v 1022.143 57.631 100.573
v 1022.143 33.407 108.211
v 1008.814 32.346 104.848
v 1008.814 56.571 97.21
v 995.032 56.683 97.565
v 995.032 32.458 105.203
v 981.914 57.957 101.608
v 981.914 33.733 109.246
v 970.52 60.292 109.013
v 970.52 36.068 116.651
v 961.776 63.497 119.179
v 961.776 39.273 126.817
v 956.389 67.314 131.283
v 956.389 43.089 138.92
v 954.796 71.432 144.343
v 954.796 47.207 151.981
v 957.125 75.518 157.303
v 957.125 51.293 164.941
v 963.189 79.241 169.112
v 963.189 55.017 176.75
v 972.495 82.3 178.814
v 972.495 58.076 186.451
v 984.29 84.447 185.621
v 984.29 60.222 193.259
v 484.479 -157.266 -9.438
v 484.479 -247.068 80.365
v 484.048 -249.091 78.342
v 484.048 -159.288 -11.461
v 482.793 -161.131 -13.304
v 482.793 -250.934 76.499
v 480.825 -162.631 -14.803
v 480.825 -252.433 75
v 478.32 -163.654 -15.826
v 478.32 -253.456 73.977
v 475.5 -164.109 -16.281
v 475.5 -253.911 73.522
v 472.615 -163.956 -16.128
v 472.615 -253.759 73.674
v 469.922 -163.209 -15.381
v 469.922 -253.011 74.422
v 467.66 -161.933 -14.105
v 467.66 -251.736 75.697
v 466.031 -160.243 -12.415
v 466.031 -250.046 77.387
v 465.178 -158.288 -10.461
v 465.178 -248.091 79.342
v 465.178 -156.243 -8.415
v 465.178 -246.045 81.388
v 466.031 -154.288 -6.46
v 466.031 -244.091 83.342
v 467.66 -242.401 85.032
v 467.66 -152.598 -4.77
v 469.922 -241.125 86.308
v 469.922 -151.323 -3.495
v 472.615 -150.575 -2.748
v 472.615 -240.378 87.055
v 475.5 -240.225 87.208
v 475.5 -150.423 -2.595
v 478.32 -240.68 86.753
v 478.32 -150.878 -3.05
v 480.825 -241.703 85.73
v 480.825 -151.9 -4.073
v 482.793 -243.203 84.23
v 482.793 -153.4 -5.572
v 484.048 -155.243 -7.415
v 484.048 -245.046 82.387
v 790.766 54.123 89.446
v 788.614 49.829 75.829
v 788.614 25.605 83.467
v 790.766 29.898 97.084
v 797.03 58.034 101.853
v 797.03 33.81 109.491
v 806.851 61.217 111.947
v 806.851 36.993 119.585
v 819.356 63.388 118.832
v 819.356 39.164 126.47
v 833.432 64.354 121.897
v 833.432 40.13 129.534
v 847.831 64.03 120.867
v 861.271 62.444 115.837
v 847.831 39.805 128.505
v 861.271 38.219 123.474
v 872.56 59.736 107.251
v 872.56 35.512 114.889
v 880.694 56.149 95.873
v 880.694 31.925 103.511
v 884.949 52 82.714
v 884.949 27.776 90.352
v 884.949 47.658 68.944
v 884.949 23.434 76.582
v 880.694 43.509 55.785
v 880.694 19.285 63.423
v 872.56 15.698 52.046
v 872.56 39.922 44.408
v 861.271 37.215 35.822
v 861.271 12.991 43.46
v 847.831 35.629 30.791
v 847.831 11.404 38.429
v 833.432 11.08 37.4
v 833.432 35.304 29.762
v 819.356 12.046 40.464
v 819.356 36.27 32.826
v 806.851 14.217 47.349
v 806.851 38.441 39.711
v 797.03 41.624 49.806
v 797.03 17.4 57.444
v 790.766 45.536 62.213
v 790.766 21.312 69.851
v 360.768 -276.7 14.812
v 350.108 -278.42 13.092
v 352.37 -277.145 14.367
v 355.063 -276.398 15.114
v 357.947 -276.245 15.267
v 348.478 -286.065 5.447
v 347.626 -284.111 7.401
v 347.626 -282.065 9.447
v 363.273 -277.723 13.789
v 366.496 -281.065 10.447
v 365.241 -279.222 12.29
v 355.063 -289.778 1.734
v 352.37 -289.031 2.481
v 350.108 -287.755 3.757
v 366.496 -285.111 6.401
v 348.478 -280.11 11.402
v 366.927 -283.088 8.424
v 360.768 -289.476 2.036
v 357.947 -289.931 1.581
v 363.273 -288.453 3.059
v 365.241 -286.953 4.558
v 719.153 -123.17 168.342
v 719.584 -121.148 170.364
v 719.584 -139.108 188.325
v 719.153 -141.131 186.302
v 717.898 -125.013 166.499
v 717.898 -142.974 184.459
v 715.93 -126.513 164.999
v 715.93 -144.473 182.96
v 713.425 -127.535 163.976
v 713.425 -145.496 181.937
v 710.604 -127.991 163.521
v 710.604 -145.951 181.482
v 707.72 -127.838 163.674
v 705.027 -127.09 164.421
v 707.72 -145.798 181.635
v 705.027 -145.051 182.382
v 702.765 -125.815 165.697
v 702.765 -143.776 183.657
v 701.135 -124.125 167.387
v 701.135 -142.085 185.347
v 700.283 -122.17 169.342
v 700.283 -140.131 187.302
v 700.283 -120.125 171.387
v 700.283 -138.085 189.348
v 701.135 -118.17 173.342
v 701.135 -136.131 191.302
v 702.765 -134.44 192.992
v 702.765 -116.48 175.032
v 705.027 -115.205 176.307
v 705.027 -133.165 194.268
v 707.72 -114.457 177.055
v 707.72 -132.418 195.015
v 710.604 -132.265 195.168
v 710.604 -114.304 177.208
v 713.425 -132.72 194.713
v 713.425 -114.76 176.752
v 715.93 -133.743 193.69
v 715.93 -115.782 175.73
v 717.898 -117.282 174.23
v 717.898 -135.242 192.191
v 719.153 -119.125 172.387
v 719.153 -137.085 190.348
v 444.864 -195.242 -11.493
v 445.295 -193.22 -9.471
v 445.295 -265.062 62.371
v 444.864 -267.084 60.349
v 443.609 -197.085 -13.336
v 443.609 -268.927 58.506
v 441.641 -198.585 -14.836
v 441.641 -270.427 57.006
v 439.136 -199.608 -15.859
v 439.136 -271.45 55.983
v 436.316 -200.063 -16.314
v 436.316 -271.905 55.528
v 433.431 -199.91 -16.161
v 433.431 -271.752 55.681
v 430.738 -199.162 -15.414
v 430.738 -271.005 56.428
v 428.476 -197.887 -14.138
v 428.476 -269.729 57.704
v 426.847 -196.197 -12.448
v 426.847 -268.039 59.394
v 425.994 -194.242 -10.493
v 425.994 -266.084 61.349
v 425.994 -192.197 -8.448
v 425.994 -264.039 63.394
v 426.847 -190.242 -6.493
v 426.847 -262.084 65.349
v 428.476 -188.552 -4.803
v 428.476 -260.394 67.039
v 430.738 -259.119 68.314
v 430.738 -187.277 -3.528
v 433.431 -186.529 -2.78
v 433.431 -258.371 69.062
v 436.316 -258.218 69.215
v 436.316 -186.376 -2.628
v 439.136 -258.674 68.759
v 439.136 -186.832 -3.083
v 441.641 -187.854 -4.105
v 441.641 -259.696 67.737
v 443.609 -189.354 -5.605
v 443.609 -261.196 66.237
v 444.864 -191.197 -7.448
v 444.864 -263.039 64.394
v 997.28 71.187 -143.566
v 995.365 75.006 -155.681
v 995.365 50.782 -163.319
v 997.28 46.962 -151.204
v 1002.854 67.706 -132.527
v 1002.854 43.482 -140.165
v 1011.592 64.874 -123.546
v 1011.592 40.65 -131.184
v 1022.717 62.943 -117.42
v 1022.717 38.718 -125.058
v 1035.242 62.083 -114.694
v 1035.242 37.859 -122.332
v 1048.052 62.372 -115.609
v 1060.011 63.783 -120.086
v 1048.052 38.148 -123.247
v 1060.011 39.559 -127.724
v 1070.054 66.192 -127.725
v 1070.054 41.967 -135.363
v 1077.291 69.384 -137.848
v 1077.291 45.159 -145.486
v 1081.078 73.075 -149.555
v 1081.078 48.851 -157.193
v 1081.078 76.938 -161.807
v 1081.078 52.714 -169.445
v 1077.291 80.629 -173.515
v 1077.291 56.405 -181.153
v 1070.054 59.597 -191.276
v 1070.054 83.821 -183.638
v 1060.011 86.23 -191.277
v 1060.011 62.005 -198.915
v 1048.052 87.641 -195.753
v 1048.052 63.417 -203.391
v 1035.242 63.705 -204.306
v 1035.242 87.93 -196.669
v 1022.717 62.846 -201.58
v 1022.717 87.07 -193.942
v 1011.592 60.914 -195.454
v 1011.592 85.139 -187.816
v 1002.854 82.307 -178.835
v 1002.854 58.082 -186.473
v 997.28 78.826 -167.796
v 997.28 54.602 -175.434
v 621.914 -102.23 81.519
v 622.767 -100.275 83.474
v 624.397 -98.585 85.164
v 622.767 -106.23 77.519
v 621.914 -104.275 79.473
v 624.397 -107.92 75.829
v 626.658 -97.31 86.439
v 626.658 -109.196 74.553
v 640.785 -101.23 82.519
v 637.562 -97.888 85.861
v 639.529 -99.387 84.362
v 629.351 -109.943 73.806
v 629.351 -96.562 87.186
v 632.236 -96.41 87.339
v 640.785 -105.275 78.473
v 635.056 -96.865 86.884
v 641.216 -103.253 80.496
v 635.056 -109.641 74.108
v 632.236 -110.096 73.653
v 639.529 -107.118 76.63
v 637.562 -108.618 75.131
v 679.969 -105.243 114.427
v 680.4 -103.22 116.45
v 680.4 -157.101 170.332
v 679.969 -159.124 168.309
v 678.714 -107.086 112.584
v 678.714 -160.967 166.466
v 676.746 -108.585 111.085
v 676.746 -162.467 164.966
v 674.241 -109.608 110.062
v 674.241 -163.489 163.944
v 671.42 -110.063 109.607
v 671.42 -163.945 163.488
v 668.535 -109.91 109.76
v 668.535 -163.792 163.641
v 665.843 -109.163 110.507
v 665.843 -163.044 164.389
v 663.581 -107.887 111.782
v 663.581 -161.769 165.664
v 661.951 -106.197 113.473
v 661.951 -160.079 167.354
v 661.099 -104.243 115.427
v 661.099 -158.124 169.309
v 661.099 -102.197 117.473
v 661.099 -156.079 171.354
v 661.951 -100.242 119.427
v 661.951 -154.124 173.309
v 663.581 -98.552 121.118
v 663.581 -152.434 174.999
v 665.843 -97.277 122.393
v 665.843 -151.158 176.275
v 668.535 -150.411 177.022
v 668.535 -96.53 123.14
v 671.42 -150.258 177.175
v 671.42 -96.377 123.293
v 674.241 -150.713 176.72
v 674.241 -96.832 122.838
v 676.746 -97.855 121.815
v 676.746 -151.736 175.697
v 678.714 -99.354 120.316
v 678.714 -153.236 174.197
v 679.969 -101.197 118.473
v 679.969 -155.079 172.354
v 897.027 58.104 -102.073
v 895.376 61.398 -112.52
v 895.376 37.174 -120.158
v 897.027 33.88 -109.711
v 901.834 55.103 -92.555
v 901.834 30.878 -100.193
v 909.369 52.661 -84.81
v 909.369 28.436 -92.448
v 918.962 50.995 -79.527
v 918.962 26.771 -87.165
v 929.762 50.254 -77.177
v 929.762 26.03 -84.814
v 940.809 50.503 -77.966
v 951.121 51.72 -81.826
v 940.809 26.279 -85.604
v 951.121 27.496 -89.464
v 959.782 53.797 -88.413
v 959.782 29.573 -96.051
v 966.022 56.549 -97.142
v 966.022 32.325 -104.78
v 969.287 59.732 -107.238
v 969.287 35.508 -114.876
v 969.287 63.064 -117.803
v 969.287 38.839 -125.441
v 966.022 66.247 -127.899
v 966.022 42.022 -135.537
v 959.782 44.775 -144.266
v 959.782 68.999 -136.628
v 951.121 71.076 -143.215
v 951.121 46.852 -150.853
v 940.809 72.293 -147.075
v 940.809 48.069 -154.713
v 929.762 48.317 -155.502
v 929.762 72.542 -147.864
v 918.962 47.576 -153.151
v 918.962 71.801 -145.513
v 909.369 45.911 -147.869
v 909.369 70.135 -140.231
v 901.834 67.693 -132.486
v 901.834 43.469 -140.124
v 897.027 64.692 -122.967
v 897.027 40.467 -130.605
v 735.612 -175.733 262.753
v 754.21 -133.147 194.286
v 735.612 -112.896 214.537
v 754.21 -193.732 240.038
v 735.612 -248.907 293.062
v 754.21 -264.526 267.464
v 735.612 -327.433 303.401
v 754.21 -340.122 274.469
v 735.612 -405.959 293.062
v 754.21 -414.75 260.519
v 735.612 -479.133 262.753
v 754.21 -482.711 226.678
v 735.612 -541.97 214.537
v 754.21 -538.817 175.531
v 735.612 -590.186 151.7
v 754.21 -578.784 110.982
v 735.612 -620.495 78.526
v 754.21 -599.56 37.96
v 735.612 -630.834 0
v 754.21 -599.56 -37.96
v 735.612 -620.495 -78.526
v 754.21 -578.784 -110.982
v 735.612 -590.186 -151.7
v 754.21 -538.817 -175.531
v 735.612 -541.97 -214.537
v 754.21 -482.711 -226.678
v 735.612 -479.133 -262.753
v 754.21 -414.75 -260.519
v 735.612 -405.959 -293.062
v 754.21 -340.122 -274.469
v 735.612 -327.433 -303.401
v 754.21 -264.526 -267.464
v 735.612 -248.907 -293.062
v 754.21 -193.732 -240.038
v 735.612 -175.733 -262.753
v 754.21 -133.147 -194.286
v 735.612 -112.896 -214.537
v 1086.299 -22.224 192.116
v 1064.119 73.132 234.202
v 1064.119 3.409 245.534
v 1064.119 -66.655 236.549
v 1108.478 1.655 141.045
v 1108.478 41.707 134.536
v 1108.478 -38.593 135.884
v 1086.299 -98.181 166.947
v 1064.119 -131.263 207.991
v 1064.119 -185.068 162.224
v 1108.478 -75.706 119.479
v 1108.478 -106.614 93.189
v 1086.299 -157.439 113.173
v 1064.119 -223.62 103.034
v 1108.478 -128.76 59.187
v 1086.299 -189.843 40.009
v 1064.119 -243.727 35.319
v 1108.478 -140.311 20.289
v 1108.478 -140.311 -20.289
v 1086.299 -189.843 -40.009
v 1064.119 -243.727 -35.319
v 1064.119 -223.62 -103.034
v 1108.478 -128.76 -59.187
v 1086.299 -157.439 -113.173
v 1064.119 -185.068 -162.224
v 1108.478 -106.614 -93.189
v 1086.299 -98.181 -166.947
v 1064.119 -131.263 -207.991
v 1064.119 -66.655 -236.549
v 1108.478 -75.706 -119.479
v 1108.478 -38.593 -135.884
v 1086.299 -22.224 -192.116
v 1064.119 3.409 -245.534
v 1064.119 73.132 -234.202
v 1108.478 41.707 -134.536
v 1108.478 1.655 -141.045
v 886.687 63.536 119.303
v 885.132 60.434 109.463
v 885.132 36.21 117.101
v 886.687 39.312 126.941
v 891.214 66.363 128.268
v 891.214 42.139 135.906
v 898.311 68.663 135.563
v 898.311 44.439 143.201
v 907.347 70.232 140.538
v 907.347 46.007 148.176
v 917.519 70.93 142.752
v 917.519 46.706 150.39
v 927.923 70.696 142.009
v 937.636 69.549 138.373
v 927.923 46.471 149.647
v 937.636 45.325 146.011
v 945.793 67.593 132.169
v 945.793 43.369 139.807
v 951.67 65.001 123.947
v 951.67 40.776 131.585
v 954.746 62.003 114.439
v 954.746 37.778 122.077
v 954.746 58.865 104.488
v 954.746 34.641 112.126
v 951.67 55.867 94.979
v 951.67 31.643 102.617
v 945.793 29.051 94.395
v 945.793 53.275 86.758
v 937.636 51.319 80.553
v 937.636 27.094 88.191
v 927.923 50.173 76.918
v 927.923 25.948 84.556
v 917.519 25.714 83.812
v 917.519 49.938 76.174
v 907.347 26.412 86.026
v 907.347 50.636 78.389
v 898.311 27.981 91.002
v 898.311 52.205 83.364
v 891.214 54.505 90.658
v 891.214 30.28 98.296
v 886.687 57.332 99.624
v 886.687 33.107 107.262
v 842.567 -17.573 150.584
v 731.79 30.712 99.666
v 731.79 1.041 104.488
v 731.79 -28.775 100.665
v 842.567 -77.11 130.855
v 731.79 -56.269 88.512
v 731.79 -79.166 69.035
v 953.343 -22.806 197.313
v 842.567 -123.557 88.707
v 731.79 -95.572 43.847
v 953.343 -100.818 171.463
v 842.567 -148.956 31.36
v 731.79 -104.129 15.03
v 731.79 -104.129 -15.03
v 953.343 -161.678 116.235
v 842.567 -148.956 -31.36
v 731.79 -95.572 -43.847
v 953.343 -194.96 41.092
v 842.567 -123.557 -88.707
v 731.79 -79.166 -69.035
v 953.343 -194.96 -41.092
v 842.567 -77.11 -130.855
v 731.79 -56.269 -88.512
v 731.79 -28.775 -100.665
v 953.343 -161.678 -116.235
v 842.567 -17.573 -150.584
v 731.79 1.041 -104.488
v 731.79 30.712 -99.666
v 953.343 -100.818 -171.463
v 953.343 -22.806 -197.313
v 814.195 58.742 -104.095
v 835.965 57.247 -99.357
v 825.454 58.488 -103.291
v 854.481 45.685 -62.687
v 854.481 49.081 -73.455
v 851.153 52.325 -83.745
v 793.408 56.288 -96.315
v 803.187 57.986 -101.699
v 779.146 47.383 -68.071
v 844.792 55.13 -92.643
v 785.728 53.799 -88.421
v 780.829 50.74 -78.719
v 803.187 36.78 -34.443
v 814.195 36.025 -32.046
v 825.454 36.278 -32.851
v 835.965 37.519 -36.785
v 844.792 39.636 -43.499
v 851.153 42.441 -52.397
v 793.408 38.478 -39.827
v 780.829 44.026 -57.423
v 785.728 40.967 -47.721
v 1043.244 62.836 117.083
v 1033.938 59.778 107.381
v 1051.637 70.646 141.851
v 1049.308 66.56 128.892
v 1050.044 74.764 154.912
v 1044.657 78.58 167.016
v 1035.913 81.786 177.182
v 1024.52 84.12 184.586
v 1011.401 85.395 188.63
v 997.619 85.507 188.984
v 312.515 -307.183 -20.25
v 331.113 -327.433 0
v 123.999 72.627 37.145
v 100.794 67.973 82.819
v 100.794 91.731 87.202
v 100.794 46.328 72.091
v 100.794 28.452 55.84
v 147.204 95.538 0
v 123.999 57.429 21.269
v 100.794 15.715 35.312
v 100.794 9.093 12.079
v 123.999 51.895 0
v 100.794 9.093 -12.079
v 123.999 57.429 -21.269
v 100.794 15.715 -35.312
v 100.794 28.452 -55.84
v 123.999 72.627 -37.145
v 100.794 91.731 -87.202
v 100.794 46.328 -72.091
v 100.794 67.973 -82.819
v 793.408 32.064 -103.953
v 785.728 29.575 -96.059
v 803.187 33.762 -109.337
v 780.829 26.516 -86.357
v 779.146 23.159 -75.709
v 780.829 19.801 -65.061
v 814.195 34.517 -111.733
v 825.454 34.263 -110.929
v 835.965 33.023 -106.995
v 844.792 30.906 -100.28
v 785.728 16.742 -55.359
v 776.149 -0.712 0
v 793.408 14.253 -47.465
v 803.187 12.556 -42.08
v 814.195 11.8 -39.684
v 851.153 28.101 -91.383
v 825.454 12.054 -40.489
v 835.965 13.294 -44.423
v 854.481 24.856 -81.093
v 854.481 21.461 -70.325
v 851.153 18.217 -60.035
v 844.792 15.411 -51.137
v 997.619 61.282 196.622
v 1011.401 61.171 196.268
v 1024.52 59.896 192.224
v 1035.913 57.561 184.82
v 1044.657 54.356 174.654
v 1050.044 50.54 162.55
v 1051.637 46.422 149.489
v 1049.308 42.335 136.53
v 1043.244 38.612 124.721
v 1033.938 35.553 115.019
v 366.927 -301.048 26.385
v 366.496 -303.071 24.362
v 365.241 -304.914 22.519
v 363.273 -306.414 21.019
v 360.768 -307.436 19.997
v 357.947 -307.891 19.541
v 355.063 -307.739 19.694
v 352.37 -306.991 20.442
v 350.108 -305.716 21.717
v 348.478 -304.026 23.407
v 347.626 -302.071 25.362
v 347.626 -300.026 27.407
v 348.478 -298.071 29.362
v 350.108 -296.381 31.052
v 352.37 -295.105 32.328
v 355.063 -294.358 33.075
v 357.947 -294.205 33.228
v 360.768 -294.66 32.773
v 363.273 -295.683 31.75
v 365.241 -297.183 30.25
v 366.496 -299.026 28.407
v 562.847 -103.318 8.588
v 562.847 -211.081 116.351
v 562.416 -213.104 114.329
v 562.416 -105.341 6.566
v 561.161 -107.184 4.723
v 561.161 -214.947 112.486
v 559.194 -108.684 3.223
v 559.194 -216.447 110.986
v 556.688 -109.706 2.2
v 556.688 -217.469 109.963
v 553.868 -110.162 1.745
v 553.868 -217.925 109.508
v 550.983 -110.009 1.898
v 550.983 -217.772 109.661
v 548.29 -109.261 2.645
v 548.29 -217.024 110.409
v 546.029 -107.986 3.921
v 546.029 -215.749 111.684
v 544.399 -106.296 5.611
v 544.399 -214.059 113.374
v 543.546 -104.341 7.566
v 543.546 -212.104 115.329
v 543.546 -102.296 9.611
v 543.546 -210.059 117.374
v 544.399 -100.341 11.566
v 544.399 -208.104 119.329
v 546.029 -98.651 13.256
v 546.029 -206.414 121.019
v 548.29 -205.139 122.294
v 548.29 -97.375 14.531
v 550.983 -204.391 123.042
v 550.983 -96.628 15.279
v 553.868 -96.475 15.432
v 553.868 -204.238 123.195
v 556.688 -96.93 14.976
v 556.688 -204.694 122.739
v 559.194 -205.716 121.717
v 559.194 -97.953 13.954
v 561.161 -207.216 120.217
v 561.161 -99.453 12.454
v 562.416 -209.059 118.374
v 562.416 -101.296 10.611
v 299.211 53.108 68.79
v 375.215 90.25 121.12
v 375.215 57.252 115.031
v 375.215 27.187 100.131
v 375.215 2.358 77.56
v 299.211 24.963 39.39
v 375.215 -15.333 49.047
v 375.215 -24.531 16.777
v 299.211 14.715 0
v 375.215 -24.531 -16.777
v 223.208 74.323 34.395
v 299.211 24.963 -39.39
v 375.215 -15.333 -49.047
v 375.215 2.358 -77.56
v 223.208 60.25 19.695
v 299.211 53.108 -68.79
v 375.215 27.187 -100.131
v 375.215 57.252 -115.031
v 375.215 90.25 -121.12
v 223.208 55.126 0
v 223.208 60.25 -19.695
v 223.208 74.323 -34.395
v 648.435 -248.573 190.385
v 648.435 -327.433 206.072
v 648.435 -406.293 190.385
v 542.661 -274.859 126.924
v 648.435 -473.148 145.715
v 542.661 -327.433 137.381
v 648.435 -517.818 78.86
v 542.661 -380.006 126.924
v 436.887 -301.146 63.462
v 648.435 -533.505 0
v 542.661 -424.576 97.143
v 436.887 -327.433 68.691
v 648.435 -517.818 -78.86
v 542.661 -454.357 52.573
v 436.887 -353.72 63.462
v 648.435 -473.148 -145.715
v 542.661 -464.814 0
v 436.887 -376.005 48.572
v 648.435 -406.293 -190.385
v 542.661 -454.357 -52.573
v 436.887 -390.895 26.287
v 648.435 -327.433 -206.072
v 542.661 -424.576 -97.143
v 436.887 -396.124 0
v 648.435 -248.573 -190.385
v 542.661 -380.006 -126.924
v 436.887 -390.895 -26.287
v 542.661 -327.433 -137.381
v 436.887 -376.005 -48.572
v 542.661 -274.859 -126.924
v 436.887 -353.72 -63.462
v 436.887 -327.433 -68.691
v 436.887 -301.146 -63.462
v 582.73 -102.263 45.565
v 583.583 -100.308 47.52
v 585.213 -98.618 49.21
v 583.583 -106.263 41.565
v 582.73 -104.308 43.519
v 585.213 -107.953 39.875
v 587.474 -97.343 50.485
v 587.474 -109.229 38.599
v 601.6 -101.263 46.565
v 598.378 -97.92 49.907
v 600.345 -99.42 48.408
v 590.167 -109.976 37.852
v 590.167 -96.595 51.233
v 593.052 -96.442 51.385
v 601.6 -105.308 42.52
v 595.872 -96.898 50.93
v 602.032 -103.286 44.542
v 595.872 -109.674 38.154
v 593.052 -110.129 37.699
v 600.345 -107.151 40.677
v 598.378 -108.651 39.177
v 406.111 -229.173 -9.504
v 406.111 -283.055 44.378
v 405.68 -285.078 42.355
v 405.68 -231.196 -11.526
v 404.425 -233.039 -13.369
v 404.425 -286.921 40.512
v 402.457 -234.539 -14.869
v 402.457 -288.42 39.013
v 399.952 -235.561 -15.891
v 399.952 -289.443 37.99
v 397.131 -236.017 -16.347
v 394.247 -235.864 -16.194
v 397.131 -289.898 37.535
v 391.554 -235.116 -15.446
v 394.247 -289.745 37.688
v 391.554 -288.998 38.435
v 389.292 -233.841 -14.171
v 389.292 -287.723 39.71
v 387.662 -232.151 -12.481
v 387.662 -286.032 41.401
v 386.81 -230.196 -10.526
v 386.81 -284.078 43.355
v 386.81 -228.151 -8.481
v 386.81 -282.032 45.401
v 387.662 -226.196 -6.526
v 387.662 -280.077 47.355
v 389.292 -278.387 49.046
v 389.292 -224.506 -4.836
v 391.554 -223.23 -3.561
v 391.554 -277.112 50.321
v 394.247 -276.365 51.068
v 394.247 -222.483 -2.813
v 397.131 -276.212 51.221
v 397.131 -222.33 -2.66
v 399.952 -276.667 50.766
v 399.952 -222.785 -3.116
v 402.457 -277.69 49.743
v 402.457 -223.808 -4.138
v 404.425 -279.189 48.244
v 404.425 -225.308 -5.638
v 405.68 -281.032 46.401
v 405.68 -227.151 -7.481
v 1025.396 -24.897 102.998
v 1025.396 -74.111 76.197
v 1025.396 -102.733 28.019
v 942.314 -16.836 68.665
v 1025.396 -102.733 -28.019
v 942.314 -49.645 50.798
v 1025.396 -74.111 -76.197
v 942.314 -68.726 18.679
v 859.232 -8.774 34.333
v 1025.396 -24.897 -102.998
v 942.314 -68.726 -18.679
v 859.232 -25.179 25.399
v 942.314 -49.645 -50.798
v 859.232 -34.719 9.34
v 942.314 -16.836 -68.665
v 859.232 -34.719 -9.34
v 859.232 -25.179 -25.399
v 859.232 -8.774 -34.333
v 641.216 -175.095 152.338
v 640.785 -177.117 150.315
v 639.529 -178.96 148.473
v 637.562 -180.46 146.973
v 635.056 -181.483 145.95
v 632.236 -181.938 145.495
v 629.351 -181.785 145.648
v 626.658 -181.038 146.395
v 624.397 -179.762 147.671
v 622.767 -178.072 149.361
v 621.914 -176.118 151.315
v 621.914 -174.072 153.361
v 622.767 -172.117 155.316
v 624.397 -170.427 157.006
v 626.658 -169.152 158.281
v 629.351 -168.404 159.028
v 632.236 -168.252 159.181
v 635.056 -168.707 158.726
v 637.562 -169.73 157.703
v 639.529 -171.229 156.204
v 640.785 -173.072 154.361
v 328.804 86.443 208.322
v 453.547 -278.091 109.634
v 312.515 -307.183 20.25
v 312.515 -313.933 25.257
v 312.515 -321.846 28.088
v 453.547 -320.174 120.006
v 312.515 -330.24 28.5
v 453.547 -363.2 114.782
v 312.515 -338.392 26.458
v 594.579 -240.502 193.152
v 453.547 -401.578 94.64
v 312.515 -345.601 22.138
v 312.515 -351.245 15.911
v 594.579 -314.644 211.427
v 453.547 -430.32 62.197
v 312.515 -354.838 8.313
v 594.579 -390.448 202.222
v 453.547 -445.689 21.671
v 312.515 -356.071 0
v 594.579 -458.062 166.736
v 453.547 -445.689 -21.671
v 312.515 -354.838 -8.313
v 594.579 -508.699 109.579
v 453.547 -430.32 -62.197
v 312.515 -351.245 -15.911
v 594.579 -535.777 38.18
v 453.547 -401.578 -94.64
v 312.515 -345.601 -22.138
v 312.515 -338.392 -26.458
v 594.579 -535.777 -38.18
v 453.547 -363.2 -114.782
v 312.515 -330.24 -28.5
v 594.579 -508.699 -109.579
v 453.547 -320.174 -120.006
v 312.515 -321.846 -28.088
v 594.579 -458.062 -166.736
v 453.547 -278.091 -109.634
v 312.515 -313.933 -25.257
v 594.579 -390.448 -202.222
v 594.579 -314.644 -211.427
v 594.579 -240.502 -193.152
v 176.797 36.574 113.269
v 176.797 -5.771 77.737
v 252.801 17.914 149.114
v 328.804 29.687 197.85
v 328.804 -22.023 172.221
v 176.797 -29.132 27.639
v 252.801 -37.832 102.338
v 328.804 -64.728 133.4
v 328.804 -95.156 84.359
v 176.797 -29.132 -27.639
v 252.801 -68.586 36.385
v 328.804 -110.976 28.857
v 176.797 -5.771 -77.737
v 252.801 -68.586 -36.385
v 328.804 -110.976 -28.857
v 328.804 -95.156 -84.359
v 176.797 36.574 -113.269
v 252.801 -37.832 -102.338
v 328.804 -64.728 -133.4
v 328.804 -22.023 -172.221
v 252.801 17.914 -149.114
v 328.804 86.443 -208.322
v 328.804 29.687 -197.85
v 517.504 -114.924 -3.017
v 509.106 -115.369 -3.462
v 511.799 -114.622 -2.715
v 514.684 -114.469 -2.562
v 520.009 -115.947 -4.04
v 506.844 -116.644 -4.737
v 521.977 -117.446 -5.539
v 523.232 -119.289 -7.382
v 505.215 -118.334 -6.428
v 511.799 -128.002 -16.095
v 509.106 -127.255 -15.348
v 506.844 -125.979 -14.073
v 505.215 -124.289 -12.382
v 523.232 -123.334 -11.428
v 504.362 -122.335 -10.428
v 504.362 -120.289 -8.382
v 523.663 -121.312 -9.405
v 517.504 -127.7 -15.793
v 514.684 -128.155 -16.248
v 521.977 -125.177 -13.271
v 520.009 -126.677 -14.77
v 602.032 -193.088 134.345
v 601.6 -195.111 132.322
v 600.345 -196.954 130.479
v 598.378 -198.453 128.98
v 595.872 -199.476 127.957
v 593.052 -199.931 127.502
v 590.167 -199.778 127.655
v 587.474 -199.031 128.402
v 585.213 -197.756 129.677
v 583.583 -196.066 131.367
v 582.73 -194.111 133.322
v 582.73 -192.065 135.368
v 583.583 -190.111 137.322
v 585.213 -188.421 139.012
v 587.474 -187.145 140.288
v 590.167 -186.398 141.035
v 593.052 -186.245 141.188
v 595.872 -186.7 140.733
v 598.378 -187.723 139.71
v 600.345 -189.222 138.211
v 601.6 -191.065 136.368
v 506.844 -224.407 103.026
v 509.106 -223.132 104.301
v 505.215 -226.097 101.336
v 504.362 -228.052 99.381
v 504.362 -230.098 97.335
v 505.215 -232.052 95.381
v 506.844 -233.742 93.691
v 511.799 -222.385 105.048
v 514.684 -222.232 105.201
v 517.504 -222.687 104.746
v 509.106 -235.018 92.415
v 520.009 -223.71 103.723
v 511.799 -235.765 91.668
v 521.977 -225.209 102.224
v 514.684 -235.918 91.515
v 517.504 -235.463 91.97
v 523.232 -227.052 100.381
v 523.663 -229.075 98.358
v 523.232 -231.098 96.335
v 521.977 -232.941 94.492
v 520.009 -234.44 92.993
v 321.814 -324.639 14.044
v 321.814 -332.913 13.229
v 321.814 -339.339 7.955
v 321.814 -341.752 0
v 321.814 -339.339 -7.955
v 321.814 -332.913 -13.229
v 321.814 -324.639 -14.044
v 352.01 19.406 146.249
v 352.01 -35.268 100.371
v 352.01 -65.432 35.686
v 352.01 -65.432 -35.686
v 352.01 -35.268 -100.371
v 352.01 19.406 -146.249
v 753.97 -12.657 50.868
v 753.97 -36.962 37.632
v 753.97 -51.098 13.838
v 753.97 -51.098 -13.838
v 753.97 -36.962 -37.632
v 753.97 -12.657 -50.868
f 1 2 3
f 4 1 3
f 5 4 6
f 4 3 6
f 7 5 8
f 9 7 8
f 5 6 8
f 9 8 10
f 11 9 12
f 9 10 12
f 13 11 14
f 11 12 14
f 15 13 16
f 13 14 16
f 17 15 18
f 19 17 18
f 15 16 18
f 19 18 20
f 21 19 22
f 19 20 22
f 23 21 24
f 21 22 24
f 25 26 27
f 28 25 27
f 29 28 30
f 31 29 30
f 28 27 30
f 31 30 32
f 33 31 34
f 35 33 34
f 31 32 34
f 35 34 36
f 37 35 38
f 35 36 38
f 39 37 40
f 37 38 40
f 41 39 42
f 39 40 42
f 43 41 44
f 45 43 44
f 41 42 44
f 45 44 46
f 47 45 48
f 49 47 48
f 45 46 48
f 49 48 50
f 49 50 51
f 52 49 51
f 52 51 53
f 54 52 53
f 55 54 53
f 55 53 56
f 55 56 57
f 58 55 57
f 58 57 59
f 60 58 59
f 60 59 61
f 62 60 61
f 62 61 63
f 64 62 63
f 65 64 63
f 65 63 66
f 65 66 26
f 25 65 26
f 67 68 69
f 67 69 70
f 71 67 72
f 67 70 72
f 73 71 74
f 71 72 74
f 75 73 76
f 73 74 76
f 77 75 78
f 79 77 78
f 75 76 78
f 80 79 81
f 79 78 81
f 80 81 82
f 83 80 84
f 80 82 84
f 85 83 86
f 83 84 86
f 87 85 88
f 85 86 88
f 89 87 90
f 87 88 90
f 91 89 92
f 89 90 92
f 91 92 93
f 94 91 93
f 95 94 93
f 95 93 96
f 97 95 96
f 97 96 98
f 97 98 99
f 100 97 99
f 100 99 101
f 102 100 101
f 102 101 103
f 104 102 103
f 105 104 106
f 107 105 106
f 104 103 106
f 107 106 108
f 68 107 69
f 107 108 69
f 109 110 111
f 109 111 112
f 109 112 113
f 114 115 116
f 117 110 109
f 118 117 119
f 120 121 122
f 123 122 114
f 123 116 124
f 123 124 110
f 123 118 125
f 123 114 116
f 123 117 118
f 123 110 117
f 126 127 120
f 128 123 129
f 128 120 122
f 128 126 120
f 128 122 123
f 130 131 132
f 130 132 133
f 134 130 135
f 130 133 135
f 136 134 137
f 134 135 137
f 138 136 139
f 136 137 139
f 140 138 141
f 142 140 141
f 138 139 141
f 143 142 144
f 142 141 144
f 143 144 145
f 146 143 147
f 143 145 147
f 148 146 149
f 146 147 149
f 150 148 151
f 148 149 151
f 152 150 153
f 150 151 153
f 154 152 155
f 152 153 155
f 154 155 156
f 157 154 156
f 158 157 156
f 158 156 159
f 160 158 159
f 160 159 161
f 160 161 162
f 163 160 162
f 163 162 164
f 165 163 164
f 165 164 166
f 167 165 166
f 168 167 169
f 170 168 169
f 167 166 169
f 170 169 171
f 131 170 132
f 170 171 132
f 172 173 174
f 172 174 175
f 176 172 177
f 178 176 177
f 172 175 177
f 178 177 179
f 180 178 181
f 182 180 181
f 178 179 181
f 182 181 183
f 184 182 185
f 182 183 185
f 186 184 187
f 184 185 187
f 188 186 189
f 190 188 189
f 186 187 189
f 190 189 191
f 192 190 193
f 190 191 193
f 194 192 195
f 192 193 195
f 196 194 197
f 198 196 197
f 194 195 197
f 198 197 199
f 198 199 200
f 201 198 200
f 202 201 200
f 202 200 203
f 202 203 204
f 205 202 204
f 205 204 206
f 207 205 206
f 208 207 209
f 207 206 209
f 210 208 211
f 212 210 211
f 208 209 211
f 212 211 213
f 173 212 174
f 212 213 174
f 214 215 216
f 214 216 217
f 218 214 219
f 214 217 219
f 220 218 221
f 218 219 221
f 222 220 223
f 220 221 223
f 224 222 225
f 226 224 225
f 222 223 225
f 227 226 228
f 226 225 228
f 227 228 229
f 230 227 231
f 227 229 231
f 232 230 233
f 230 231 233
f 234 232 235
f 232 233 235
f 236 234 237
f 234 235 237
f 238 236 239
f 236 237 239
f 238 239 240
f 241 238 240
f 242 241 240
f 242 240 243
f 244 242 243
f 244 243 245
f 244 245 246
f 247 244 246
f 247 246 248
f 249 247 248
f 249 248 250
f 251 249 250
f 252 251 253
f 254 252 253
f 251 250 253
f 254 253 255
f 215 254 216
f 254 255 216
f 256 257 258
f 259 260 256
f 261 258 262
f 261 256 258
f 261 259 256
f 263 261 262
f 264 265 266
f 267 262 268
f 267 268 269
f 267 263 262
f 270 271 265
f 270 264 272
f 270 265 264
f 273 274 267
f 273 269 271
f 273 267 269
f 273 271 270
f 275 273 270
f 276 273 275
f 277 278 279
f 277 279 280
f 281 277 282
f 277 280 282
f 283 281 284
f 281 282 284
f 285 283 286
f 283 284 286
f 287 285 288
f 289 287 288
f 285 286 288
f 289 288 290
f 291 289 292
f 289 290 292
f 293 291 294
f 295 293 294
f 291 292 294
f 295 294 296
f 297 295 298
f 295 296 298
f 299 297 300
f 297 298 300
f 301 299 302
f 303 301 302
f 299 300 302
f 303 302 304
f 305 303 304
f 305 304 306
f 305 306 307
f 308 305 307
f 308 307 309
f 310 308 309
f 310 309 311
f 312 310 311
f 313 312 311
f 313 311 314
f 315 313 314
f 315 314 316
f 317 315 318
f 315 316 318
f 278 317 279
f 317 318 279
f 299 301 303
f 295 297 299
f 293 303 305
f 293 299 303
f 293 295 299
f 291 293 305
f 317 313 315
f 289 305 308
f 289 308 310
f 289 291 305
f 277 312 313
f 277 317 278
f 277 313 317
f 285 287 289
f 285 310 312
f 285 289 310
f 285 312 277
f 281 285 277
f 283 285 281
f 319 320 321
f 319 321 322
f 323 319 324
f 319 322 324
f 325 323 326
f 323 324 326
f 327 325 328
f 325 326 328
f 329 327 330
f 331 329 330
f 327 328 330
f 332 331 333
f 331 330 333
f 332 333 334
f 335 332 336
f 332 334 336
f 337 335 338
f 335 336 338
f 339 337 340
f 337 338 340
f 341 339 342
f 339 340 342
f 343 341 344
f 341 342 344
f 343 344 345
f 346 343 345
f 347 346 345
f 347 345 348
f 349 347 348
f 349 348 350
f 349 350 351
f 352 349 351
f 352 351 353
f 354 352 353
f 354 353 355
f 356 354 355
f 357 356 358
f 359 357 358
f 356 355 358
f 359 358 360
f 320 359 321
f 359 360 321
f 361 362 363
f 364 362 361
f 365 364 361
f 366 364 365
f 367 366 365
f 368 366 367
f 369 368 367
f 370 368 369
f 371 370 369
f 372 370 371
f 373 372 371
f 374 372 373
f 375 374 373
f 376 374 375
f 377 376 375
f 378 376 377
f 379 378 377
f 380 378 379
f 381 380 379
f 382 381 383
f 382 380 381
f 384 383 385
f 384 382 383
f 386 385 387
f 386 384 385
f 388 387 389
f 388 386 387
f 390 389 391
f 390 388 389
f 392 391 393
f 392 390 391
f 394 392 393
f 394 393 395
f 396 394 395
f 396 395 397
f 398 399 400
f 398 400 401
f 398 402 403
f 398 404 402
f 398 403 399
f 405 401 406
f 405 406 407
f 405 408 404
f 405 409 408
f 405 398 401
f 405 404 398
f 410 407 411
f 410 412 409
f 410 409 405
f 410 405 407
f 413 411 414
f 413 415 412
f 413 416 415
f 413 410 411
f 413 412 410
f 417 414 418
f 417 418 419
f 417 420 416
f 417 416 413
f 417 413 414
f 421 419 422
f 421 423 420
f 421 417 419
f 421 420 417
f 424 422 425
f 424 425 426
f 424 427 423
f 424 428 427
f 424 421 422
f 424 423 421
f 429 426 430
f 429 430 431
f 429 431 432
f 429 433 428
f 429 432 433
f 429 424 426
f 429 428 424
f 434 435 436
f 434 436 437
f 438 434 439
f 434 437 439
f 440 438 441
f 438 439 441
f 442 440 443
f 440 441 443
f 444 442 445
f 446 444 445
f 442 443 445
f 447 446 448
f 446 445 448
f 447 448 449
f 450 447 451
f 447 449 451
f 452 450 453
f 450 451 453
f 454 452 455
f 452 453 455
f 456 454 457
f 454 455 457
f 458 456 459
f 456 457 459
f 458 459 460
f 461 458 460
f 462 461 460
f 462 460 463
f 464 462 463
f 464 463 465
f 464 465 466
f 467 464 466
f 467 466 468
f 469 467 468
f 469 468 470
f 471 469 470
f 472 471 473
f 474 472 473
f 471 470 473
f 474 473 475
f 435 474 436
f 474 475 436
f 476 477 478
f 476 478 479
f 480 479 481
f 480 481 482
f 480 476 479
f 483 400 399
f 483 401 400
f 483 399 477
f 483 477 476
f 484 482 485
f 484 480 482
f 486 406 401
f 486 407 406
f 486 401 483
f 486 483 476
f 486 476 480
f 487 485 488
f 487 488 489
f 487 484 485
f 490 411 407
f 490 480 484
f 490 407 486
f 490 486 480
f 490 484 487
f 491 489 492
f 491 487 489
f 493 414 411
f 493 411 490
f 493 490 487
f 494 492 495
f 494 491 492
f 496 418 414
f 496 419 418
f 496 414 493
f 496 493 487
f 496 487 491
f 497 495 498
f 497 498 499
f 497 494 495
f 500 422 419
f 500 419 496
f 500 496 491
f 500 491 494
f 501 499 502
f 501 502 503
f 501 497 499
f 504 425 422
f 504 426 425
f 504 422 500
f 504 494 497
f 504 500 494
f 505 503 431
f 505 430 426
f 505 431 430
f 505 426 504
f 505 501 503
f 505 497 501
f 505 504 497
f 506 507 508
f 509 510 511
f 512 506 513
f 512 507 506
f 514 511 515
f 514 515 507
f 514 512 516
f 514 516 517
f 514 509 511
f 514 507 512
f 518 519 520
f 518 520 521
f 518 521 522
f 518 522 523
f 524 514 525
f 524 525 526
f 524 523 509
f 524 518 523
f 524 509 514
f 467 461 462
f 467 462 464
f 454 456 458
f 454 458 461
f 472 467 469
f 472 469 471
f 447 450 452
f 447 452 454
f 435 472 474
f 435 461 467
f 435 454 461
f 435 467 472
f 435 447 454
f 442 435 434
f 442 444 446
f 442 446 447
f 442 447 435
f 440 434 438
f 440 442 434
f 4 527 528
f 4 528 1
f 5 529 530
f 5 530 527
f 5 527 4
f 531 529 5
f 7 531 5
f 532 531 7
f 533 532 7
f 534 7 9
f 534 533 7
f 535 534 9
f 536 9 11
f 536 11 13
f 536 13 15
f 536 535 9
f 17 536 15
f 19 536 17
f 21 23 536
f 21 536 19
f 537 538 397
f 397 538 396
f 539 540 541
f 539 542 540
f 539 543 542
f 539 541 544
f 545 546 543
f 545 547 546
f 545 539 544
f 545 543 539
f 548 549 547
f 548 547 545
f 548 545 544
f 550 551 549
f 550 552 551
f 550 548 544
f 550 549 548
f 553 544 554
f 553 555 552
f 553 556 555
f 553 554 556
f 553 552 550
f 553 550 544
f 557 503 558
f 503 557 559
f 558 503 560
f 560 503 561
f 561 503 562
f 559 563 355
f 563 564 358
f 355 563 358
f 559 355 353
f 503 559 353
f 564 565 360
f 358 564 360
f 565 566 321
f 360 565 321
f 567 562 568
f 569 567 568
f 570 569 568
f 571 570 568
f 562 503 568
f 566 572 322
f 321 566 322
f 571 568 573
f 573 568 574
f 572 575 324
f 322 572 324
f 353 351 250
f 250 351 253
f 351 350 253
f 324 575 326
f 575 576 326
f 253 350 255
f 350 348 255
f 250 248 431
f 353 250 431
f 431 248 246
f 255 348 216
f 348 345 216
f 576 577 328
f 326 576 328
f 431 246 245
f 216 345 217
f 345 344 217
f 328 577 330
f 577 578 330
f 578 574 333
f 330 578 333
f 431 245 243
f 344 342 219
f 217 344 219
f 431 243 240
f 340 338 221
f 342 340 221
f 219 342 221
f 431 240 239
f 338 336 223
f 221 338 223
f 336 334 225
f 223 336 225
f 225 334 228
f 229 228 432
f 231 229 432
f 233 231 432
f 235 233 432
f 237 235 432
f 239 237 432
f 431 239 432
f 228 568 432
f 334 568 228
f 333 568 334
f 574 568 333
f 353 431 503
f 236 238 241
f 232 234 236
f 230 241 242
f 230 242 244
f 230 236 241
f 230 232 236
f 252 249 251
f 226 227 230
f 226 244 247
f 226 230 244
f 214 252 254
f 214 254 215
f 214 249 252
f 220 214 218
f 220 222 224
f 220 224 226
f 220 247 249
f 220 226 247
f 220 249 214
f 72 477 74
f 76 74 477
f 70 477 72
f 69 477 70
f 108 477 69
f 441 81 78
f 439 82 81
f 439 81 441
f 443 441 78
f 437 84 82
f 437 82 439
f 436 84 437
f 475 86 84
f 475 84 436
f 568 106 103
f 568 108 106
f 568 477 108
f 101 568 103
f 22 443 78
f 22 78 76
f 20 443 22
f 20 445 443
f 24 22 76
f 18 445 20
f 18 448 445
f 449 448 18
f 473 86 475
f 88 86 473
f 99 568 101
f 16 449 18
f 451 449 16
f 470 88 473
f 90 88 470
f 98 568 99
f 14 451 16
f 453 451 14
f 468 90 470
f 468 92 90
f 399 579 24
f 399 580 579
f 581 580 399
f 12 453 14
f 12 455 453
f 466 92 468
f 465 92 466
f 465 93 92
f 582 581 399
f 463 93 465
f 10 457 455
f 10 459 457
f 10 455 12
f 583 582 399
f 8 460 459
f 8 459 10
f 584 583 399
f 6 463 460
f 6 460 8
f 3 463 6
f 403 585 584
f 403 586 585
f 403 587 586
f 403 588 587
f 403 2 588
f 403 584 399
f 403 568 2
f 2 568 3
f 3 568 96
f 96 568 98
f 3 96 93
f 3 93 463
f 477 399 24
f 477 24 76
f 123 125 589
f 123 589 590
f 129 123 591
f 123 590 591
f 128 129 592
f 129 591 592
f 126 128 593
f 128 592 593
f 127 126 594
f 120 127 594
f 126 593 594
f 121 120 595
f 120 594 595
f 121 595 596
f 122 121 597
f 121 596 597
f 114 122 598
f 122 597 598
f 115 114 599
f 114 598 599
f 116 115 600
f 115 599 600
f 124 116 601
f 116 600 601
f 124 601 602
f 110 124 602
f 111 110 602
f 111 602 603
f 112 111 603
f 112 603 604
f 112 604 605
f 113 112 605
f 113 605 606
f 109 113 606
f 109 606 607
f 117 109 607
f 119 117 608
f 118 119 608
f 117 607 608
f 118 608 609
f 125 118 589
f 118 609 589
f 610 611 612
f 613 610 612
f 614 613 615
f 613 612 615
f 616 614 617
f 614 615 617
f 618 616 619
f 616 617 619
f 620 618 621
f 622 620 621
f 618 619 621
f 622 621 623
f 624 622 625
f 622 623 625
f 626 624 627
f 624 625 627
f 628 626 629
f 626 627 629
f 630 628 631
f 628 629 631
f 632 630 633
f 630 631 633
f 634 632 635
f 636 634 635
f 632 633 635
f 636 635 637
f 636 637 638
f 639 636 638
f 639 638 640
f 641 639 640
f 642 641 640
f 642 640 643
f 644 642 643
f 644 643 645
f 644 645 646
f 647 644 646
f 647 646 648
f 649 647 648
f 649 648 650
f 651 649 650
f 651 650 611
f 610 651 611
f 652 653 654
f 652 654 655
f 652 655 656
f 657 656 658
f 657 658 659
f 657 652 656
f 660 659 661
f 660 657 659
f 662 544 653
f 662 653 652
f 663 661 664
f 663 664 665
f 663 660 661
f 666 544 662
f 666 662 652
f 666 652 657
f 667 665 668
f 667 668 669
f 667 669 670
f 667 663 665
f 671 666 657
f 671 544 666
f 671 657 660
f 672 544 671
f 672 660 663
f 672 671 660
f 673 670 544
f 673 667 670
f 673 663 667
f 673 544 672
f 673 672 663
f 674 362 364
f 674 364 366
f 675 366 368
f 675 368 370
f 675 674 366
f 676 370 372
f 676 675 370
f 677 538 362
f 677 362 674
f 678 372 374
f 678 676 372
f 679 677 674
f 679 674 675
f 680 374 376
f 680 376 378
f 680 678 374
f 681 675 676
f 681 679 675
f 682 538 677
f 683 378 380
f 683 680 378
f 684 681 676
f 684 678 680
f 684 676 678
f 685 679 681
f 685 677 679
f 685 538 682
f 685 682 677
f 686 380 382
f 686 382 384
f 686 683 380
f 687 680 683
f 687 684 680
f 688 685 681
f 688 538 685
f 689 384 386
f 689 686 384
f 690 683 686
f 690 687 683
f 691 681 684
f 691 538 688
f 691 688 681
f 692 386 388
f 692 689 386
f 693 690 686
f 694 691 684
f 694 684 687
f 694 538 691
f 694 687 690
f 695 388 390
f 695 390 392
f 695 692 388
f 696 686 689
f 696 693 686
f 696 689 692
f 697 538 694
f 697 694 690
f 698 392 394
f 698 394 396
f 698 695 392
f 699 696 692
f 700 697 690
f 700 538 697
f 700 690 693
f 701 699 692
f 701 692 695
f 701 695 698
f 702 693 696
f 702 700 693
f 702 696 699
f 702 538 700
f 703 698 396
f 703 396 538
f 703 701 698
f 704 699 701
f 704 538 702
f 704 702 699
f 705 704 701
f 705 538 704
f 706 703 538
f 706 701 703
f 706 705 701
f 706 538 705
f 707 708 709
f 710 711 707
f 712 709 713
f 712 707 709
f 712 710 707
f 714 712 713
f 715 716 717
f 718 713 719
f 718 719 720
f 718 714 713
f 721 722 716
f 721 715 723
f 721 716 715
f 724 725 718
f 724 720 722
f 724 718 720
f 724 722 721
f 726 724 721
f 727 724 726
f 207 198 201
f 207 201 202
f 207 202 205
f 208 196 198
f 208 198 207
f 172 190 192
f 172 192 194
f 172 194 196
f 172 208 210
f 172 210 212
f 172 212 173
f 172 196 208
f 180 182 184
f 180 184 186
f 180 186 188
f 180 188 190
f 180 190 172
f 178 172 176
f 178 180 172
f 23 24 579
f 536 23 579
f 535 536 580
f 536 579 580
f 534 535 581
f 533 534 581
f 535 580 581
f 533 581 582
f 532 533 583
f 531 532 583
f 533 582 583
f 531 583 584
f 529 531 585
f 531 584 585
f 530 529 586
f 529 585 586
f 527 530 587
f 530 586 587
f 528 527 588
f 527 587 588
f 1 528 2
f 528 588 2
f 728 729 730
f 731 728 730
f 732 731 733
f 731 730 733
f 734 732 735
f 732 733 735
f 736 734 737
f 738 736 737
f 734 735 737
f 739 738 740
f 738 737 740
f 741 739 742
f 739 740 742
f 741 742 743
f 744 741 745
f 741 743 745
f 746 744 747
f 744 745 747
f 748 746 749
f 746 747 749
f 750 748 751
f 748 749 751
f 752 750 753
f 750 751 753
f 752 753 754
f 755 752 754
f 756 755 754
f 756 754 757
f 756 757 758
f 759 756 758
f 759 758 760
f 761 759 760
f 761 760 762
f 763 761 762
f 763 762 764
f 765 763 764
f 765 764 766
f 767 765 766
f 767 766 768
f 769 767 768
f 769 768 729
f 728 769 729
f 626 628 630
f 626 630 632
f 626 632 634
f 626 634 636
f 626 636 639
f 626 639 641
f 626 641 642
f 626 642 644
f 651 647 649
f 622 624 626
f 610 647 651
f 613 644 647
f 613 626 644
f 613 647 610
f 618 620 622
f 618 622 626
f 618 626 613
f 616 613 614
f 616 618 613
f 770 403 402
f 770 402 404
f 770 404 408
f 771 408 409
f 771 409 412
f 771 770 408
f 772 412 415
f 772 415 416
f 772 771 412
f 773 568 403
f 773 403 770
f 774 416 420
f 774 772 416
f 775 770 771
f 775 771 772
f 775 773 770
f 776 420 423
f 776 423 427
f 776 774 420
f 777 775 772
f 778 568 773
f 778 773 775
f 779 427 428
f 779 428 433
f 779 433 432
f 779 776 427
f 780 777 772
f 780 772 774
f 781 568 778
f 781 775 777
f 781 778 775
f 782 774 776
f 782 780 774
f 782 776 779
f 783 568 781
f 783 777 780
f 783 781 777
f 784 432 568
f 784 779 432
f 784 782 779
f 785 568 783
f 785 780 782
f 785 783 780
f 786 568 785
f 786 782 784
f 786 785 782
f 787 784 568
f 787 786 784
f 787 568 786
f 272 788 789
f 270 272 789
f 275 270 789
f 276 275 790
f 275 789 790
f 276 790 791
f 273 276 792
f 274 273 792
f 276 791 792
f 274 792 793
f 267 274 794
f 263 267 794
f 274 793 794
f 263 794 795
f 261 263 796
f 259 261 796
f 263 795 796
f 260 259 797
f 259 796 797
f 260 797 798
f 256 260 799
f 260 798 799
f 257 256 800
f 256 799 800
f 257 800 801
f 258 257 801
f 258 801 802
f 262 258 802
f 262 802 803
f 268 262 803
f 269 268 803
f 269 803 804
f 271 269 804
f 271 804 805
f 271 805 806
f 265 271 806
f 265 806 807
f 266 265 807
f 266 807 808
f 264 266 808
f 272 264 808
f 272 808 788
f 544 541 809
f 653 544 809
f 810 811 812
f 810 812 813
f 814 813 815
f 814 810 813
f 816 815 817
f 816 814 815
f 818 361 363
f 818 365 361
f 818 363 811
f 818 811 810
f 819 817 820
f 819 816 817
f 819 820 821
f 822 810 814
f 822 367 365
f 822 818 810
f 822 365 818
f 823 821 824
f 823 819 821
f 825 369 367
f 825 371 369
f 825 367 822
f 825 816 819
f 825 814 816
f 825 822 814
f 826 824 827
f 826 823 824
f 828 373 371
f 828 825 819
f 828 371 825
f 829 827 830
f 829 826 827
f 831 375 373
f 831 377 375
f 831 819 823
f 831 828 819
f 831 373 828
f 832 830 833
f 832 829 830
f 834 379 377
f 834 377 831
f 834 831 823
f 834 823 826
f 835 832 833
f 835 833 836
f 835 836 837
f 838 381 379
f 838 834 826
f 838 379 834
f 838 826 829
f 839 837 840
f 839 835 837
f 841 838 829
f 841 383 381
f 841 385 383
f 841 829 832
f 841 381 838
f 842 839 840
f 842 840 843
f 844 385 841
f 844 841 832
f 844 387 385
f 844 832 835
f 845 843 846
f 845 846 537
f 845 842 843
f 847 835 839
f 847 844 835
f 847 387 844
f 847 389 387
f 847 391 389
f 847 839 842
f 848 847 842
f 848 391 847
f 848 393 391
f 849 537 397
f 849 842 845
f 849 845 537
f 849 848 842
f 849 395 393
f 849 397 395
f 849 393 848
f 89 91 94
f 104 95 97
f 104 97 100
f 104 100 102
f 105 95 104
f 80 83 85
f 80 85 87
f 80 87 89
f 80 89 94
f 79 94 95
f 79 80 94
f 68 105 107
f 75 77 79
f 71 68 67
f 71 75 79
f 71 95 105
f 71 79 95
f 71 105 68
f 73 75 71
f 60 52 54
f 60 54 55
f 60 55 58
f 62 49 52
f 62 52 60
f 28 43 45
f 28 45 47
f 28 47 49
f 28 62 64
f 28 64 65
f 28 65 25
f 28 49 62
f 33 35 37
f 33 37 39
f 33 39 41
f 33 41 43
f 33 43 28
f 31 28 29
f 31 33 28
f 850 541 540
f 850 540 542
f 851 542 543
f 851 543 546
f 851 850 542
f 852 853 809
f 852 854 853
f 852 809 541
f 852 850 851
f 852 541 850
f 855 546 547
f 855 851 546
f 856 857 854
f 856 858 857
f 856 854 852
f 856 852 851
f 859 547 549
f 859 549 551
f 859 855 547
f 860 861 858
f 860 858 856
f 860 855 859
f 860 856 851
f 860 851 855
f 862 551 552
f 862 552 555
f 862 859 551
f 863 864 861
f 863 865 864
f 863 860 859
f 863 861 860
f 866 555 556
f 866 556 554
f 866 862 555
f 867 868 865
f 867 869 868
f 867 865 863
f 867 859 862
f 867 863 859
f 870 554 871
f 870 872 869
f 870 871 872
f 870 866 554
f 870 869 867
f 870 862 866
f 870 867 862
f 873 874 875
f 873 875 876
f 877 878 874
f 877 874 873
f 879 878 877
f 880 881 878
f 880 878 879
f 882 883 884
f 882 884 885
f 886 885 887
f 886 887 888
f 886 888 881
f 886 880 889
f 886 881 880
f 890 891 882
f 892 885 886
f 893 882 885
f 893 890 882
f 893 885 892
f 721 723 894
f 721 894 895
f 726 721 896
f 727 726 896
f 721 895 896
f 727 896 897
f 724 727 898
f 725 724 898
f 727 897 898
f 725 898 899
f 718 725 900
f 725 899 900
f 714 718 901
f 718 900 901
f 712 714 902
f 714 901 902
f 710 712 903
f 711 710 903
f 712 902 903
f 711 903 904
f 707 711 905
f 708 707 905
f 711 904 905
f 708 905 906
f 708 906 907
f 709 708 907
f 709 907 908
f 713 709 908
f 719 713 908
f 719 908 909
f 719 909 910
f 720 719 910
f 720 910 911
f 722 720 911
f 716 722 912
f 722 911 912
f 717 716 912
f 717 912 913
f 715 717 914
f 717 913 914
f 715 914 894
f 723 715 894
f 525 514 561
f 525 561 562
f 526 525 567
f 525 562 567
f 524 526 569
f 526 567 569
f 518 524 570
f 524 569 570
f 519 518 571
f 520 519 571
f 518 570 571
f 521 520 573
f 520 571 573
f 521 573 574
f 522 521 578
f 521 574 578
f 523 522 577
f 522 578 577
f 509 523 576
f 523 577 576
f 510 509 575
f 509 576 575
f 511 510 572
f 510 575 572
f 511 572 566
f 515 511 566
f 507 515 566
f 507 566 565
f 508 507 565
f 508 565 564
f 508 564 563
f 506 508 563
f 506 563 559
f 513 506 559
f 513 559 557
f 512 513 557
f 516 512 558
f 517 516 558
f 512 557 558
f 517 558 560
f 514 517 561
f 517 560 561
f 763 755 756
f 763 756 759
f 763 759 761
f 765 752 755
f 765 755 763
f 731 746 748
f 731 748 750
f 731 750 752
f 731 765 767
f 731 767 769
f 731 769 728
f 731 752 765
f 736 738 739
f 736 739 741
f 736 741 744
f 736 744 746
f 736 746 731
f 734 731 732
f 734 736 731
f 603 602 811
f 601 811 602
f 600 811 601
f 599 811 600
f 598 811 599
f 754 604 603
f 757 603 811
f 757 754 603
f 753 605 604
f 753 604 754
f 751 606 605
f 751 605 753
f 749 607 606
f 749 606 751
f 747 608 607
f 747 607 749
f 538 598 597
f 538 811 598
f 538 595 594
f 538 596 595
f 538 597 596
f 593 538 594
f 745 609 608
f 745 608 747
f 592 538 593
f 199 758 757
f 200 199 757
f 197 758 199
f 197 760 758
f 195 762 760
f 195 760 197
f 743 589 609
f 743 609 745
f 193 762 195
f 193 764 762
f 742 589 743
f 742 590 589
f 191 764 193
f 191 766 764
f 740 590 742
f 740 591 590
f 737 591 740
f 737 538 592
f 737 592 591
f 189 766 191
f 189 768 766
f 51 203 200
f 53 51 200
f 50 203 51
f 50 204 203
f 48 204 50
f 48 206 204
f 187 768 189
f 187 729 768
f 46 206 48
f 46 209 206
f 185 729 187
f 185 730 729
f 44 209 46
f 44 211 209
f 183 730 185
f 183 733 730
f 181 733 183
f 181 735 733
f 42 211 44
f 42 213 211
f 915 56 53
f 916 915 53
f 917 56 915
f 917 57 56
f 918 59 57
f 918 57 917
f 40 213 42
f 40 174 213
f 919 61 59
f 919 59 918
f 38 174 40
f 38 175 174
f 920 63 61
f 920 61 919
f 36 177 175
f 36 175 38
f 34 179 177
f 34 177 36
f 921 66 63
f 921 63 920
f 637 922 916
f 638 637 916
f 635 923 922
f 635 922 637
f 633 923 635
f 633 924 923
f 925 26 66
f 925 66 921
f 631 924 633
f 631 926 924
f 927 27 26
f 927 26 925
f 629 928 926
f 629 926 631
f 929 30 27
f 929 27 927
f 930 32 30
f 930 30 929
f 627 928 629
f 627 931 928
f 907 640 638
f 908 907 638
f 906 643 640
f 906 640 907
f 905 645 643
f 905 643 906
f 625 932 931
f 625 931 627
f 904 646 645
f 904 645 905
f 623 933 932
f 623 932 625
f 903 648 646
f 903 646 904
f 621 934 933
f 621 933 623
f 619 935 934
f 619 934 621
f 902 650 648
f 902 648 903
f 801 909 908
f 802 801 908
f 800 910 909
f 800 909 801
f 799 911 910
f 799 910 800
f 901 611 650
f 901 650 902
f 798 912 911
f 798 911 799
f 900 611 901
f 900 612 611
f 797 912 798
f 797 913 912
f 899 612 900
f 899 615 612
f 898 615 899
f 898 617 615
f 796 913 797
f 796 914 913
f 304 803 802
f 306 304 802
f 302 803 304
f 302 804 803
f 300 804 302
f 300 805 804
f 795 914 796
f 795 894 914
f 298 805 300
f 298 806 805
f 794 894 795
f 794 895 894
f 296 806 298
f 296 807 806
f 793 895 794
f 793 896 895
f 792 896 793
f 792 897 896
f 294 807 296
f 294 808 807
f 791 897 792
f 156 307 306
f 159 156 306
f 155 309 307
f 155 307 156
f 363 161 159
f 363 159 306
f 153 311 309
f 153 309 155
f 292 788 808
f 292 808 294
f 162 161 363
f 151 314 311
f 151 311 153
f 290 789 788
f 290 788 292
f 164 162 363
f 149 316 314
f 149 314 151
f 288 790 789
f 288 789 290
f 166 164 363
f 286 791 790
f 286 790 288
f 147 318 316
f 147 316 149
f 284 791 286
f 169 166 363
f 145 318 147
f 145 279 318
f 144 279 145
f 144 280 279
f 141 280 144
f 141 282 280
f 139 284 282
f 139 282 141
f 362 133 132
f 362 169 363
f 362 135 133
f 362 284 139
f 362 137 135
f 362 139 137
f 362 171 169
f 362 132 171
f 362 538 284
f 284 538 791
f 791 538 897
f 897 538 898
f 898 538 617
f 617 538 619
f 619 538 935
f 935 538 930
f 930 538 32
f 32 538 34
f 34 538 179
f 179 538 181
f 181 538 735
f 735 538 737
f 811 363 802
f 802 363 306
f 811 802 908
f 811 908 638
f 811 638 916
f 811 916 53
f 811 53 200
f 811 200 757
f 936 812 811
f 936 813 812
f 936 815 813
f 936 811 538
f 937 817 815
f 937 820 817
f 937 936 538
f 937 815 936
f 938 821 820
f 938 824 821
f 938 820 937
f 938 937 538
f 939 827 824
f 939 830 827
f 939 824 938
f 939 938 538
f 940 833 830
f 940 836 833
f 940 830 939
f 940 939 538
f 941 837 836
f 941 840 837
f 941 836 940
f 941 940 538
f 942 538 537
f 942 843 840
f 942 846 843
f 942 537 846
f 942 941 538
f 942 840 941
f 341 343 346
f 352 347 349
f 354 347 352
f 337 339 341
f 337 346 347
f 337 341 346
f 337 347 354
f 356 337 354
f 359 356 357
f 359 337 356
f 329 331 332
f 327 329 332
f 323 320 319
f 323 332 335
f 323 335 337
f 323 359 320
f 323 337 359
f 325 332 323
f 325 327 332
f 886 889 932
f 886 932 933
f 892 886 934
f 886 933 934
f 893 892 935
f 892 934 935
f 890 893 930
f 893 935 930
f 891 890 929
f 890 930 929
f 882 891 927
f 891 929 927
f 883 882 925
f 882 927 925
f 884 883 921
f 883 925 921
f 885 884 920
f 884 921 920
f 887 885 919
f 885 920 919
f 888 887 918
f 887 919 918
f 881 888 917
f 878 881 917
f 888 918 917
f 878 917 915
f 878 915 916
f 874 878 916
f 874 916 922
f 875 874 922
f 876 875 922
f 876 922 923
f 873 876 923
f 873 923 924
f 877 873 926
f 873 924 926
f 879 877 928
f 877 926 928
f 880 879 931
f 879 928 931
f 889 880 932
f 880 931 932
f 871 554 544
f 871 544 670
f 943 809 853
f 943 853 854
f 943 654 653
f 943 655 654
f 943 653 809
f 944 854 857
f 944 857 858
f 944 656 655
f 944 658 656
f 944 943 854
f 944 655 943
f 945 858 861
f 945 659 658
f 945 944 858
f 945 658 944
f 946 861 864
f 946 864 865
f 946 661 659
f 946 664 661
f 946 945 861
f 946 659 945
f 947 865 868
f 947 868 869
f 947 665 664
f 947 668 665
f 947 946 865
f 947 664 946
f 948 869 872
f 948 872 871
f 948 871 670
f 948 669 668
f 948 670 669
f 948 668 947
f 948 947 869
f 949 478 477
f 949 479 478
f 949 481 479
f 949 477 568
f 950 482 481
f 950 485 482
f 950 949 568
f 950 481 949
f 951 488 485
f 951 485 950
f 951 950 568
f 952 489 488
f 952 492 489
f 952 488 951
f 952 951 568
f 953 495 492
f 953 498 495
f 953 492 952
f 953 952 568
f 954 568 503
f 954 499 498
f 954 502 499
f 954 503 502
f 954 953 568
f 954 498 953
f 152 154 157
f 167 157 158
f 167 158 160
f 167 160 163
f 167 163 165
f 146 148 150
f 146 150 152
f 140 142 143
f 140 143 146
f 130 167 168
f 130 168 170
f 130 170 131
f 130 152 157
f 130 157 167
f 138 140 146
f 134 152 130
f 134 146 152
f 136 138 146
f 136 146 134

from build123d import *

# Parameters (mm, degrees)
F1_ANGLE_BACK = 87.5
F1_ANGLE      = 175
F2_ANGLE_BACK = 107.5
F2_ANGLE      = 215
F3_ANGLE_BACK = 135
F3_ANGLE      = 270
F4_R          = 37.8787474823
F4_R_2        = 37.1630640443
F4_R_3        = 43.0969146211
F5_DEPTH      = 25.4
F6_R          = 48.4383232115
F6_R_2        = 35.0023630102
F7_DEPTH      = 25.4
F8_R          = 9.7048098961
F9_DEPTH      = 25.4
F10_DEPTH     = 50.8
F11_DEPTH     = 76.2
F12_DEPTH     = 101.6
F13_DEPTH     = 127


with BuildPart() as f1:
    # F0 (on Top) → F1 (revolve)
    with BuildSketch(Plane.XY, mode=Mode.PRIVATE) as f1_sk:
        Polygon((147.204149189, 95.5381169915), (100.793745595, 8.252842685), (328.8043026418, -112.9825210152), (375.2147062358, -25.6972467086), align=None)
    revolve(f1_sk.sketch.rotate(Axis((286.60620749, 95.5381169915, 0), (1, 0, 0)), -F1_ANGLE_BACK), axis=Axis((286.60620749, 95.5381169915, 0), (1, 0, 0)), revolution_arc=F1_ANGLE)


with BuildPart() as f2:
    # F0 (on Top) → F2 (revolve)
    with BuildSketch(Plane.XY, mode=Mode.PRIVATE) as f2_sk:
        Polygon((1108.4781483383, -141.7774565633), (776.1493364803, -0.7122452288), (731.7904973856, -105.2151212553), (1064.1193092436, -246.2803325899), align=None)
    revolve(f2_sk.sketch.rotate(Axis((956.6637632167, -0.7122452288, 0), (1, 0, 0)), -F2_ANGLE_BACK), axis=Axis((956.6637632167, -0.7122452288, 0), (1, 0, 0)), revolution_arc=F2_ANGLE)

    # F4 (on face) → F5 (join)
    with BuildSketch(Plane(origin=(0, -0.647841182, -0.2042635401), x_dir=(-1, 0, 0), z_dir=(0, 0.9537169507, 0.3007057995))):
        with Locations((-817.025244236, -79.1687220335)):
            Circle(F4_R)
        with Locations((-932.5394630432, -125.775411725)):
            Circle(F4_R_2)
        with Locations((-1038.4621620178, -171.0307002068)):
            Circle(F4_R_3)
    extrude(amount=F5_DEPTH)

    # F6 (on face) → F7 (join)
    with BuildSketch(Plane(origin=(0, -0.647841182, 0.2042635401), x_dir=(-1, 0, 0), z_dir=(0, 0.9537169507, -0.3007057995))):
        with Locations((-837.0521198974, 87.303564576)):
            Circle(F6_R)
        with Locations((-920.1343228619, 122.5698674096)):
            Circle(F6_R_2)
        with BuildLine():
            ThreePointArc((-954.7782026149, 157.8361702432), (-962.8244948556, 184.5710723302), (-984.2901651359, 202.4238818525))
            Line((-984.2901651359, 202.4238818525), (-1022.142886517, 113.2484586339))
            ThreePointArc((-1022.142886517, 113.2484586339), (-976.4816237395, 117.4441392725), (-954.7782026149, 157.8361702432))
        make_face()
        with BuildLine():
            Line((-1022.142886517, 113.2484586339), (-984.2901651359, 202.4238818525))
            ThreePointArc((-984.2901651359, 202.4238818525), (-1047.8042374357, 176.7625309338), (-1022.142886517, 113.2484586339))
        make_face()
    extrude(amount=F7_DEPTH)


with BuildPart() as f3:
    # F0 (on Top) → F3 (revolve)
    with BuildSketch(Plane.XY, mode=Mode.PRIVATE) as f3_sk:
        Polygon((735.6117292031, -630.8335806259), (754.2096938025, -602.1952265412), (331.1129097793, -327.4329623391), (312.51494518, -356.0713164238), align=None)
    revolve(f3_sk.sketch.rotate(Axis((583.3554470724, -327.4329623391, 0), (1, 0, 0)), -F3_ANGLE_BACK), axis=Axis((583.3554470724, -327.4329623391, 0), (1, 0, 0)), revolution_arc=F3_ANGLE)

    # F8 (on face) → F9 (join)
    with BuildSketch(Plane(origin=(0, -163.7164811695, 163.7164811695), x_dir=(1, 0, 0), z_dir=(0, 0.7071067812, -0.7071067812))):
        with Locations((709.8791248237, -34.8015947993)):
            Circle(F8_R)
        with Locations((670.6950121215, -9.3551344778)):
            Circle(F8_R)
        with Locations((631.5108994193, 16.0913258436)):
            Circle(F8_R)
        with Locations((592.3267867172, 41.5377861651)):
            Circle(F8_R)
        with Locations((553.142674015, 66.9842464866)):
            Circle(F8_R)
        with Locations((513.9585613128, 92.4307068081)):
            Circle(F8_R)
        with Locations((474.7744486107, 117.8771671296)):
            Circle(F8_R)
        with Locations((435.5903359085, 143.3236274511)):
            Circle(F8_R)
        with Locations((396.4062232063, 168.7700877726)):
            Circle(F8_R)
        with Locations((357.2221105042, 194.2165480941)):
            Circle(F8_R)
    extrude(amount=F9_DEPTH)

    # F10 (add): faces of the model
    f10_faces = [f3.faces().sort_by_distance(p)[0] for p in [
        (670.6950121215, -139.1408898992, 152.3710479556),
        (396.4062232063, -265.0944424529, 26.4174954019),
    ]]
    extrude(f10_faces, amount=F10_DEPTH)

    # F11 (add): faces of the model
    f11_faces = [f3.faces().sort_by_distance(p)[0] for p in [
        (435.5903359085, -247.1010778023, 44.4108600525),
        (631.5108994193, -157.1342545497, 134.3776833051),
    ]]
    extrude(f11_faces, amount=F11_DEPTH)

    # F12 (add): faces of the model
    f12_faces = [f3.faces().sort_by_distance(p)[0] for p in [
        (592.3267867172, -175.1276192002, 116.3843186545),
        (474.7744486107, -229.1077131518, 62.404224703),
    ]]
    extrude(f12_faces, amount=F12_DEPTH)

    # F13 (add): faces of the model
    f13_faces = [f3.faces().sort_by_distance(p)[0] for p in [
        (513.9585613128, -211.1143485013, 80.3975893535),
        (553.142674015, -193.1209838508, 98.390954004),
    ]]
    extrude(f13_faces, amount=F13_DEPTH)


solid = Compound([f1.part, f2.part, f3.part])
